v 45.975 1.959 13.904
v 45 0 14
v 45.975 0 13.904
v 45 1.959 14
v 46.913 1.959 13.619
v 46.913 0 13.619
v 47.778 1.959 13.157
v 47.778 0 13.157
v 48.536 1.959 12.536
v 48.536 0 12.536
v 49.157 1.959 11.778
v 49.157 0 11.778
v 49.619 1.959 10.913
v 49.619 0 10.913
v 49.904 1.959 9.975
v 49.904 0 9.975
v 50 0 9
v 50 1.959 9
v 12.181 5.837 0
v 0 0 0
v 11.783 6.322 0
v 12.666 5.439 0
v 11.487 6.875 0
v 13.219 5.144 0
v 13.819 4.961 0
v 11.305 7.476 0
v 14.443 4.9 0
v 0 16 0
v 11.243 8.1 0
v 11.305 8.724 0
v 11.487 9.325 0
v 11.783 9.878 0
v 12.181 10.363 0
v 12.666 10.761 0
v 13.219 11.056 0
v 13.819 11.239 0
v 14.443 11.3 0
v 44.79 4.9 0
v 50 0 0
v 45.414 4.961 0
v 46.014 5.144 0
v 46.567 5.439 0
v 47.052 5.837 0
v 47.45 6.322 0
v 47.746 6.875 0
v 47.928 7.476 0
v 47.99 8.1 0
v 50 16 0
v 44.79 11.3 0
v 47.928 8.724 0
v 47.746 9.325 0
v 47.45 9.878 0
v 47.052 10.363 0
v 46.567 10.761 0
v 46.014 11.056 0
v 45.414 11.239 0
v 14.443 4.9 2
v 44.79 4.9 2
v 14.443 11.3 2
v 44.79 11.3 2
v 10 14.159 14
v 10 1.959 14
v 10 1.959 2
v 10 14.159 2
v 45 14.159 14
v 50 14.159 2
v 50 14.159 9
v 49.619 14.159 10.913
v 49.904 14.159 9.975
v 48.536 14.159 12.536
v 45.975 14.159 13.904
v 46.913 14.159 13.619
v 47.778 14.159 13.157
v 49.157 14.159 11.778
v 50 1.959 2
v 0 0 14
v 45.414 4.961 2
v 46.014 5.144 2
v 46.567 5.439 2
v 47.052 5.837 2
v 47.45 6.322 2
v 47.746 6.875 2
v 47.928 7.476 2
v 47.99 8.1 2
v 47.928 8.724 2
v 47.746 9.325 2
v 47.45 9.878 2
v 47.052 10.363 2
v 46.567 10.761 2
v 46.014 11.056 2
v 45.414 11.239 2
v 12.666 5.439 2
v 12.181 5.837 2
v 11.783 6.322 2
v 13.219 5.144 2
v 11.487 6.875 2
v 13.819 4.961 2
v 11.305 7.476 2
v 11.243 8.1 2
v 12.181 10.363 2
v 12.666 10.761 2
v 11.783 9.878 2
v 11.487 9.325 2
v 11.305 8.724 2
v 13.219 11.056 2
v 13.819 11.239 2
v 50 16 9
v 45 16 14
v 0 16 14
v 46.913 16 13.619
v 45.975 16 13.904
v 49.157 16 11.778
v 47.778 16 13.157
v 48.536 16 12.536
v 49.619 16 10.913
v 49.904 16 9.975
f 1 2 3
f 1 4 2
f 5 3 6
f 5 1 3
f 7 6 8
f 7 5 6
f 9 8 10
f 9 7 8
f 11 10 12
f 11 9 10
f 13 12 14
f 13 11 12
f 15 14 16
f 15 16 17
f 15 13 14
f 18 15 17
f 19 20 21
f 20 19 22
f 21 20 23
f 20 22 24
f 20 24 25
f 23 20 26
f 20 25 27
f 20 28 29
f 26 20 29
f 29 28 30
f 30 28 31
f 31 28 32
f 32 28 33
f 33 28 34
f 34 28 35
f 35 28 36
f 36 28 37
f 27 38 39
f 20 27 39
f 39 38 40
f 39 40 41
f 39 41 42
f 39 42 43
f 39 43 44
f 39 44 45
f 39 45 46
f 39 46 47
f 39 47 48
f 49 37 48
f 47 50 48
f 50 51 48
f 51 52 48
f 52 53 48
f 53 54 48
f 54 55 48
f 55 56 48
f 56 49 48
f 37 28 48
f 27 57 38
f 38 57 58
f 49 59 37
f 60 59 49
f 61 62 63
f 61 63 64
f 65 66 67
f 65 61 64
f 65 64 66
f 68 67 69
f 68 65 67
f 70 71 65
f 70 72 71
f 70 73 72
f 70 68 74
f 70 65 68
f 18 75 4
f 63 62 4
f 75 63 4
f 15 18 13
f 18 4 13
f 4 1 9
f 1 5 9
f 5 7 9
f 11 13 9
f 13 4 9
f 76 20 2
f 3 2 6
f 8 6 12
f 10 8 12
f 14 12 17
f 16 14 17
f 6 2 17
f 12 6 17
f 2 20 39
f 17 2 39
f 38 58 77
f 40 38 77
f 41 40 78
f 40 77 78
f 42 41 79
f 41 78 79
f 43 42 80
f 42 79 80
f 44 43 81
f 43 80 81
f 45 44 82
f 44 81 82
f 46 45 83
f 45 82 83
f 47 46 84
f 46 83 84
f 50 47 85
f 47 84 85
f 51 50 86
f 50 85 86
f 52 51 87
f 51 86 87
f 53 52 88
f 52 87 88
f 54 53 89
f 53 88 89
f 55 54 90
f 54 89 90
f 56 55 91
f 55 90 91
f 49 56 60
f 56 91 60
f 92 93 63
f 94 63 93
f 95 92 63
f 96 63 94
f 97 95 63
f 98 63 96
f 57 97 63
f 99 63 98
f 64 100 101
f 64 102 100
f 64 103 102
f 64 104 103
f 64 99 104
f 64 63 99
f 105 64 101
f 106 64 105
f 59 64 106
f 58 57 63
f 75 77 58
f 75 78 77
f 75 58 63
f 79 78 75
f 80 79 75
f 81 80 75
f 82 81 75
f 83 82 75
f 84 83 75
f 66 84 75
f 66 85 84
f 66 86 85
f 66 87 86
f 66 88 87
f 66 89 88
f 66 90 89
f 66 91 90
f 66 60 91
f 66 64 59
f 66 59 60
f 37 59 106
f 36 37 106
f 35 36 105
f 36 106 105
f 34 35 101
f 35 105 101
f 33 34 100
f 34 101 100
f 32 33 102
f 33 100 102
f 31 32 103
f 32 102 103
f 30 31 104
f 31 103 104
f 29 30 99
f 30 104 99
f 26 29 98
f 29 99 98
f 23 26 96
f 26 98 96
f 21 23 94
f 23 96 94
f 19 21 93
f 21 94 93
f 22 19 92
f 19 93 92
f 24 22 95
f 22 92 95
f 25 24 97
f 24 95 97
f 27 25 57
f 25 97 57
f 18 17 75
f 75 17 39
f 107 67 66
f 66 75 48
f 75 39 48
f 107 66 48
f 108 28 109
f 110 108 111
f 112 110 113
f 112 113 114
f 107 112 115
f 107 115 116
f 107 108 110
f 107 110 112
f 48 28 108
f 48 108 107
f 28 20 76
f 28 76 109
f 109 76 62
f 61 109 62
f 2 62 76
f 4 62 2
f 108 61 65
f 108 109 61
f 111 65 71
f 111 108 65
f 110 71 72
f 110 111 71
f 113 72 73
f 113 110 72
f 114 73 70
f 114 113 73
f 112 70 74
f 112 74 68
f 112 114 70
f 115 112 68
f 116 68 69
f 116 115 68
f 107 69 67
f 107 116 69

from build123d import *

# Parameters (mm, degrees)
SKETCH_W        = 50
SKETCH_H        = 16
PAD_DEPTH       = 14
SKETCH001_W     = 40
SKETCH001_H     = 12.2
POCKET_DEPTH    = 12
POCKET001_DEPTH = 5
FILLET_R        = 5


with BuildPart() as part:
    # Sketch → Pad (new body)
    with BuildSketch(Plane.XY):
        with Locations((25, 8)):
            Rectangle(SKETCH_W, SKETCH_H)
    extrude(amount=PAD_DEPTH)

    # Sketch001 (on Face6 of Pad) → Pocket (cut)
    with BuildSketch(Plane.XY.offset(14)):
        with Locations((30, 8.058537)):
            Rectangle(SKETCH001_W, SKETCH001_H)
    extrude(amount=-POCKET_DEPTH, mode=Mode.SUBTRACT)

    # Sketch002 (on Face8 of Pocket) → Pocket001 (cut)
    with BuildSketch(Plane.XY.offset(2)):
        with BuildLine():
            ThreePointArc((14.443499, 11.3), (11.243499, 8.1), (14.443499, 4.9))
            Line((14.443499, 4.9), (44.78962, 4.9))
            ThreePointArc((44.78962, 4.9), (47.98962, 8.1), (44.78962, 11.3))
            Line((14.443499, 11.3), (44.78962, 11.3))
        make_face()
    extrude(amount=-POCKET001_DEPTH, mode=Mode.SUBTRACT)

    # Fillet
    fillet_edges = [part.edges().sort_by_distance(p)[0] for p in [
        (50, 0.979269, 14),
        (50, 15.079269, 14),
    ]]
    fillet(fillet_edges, radius=FILLET_R)


solid = part.part
